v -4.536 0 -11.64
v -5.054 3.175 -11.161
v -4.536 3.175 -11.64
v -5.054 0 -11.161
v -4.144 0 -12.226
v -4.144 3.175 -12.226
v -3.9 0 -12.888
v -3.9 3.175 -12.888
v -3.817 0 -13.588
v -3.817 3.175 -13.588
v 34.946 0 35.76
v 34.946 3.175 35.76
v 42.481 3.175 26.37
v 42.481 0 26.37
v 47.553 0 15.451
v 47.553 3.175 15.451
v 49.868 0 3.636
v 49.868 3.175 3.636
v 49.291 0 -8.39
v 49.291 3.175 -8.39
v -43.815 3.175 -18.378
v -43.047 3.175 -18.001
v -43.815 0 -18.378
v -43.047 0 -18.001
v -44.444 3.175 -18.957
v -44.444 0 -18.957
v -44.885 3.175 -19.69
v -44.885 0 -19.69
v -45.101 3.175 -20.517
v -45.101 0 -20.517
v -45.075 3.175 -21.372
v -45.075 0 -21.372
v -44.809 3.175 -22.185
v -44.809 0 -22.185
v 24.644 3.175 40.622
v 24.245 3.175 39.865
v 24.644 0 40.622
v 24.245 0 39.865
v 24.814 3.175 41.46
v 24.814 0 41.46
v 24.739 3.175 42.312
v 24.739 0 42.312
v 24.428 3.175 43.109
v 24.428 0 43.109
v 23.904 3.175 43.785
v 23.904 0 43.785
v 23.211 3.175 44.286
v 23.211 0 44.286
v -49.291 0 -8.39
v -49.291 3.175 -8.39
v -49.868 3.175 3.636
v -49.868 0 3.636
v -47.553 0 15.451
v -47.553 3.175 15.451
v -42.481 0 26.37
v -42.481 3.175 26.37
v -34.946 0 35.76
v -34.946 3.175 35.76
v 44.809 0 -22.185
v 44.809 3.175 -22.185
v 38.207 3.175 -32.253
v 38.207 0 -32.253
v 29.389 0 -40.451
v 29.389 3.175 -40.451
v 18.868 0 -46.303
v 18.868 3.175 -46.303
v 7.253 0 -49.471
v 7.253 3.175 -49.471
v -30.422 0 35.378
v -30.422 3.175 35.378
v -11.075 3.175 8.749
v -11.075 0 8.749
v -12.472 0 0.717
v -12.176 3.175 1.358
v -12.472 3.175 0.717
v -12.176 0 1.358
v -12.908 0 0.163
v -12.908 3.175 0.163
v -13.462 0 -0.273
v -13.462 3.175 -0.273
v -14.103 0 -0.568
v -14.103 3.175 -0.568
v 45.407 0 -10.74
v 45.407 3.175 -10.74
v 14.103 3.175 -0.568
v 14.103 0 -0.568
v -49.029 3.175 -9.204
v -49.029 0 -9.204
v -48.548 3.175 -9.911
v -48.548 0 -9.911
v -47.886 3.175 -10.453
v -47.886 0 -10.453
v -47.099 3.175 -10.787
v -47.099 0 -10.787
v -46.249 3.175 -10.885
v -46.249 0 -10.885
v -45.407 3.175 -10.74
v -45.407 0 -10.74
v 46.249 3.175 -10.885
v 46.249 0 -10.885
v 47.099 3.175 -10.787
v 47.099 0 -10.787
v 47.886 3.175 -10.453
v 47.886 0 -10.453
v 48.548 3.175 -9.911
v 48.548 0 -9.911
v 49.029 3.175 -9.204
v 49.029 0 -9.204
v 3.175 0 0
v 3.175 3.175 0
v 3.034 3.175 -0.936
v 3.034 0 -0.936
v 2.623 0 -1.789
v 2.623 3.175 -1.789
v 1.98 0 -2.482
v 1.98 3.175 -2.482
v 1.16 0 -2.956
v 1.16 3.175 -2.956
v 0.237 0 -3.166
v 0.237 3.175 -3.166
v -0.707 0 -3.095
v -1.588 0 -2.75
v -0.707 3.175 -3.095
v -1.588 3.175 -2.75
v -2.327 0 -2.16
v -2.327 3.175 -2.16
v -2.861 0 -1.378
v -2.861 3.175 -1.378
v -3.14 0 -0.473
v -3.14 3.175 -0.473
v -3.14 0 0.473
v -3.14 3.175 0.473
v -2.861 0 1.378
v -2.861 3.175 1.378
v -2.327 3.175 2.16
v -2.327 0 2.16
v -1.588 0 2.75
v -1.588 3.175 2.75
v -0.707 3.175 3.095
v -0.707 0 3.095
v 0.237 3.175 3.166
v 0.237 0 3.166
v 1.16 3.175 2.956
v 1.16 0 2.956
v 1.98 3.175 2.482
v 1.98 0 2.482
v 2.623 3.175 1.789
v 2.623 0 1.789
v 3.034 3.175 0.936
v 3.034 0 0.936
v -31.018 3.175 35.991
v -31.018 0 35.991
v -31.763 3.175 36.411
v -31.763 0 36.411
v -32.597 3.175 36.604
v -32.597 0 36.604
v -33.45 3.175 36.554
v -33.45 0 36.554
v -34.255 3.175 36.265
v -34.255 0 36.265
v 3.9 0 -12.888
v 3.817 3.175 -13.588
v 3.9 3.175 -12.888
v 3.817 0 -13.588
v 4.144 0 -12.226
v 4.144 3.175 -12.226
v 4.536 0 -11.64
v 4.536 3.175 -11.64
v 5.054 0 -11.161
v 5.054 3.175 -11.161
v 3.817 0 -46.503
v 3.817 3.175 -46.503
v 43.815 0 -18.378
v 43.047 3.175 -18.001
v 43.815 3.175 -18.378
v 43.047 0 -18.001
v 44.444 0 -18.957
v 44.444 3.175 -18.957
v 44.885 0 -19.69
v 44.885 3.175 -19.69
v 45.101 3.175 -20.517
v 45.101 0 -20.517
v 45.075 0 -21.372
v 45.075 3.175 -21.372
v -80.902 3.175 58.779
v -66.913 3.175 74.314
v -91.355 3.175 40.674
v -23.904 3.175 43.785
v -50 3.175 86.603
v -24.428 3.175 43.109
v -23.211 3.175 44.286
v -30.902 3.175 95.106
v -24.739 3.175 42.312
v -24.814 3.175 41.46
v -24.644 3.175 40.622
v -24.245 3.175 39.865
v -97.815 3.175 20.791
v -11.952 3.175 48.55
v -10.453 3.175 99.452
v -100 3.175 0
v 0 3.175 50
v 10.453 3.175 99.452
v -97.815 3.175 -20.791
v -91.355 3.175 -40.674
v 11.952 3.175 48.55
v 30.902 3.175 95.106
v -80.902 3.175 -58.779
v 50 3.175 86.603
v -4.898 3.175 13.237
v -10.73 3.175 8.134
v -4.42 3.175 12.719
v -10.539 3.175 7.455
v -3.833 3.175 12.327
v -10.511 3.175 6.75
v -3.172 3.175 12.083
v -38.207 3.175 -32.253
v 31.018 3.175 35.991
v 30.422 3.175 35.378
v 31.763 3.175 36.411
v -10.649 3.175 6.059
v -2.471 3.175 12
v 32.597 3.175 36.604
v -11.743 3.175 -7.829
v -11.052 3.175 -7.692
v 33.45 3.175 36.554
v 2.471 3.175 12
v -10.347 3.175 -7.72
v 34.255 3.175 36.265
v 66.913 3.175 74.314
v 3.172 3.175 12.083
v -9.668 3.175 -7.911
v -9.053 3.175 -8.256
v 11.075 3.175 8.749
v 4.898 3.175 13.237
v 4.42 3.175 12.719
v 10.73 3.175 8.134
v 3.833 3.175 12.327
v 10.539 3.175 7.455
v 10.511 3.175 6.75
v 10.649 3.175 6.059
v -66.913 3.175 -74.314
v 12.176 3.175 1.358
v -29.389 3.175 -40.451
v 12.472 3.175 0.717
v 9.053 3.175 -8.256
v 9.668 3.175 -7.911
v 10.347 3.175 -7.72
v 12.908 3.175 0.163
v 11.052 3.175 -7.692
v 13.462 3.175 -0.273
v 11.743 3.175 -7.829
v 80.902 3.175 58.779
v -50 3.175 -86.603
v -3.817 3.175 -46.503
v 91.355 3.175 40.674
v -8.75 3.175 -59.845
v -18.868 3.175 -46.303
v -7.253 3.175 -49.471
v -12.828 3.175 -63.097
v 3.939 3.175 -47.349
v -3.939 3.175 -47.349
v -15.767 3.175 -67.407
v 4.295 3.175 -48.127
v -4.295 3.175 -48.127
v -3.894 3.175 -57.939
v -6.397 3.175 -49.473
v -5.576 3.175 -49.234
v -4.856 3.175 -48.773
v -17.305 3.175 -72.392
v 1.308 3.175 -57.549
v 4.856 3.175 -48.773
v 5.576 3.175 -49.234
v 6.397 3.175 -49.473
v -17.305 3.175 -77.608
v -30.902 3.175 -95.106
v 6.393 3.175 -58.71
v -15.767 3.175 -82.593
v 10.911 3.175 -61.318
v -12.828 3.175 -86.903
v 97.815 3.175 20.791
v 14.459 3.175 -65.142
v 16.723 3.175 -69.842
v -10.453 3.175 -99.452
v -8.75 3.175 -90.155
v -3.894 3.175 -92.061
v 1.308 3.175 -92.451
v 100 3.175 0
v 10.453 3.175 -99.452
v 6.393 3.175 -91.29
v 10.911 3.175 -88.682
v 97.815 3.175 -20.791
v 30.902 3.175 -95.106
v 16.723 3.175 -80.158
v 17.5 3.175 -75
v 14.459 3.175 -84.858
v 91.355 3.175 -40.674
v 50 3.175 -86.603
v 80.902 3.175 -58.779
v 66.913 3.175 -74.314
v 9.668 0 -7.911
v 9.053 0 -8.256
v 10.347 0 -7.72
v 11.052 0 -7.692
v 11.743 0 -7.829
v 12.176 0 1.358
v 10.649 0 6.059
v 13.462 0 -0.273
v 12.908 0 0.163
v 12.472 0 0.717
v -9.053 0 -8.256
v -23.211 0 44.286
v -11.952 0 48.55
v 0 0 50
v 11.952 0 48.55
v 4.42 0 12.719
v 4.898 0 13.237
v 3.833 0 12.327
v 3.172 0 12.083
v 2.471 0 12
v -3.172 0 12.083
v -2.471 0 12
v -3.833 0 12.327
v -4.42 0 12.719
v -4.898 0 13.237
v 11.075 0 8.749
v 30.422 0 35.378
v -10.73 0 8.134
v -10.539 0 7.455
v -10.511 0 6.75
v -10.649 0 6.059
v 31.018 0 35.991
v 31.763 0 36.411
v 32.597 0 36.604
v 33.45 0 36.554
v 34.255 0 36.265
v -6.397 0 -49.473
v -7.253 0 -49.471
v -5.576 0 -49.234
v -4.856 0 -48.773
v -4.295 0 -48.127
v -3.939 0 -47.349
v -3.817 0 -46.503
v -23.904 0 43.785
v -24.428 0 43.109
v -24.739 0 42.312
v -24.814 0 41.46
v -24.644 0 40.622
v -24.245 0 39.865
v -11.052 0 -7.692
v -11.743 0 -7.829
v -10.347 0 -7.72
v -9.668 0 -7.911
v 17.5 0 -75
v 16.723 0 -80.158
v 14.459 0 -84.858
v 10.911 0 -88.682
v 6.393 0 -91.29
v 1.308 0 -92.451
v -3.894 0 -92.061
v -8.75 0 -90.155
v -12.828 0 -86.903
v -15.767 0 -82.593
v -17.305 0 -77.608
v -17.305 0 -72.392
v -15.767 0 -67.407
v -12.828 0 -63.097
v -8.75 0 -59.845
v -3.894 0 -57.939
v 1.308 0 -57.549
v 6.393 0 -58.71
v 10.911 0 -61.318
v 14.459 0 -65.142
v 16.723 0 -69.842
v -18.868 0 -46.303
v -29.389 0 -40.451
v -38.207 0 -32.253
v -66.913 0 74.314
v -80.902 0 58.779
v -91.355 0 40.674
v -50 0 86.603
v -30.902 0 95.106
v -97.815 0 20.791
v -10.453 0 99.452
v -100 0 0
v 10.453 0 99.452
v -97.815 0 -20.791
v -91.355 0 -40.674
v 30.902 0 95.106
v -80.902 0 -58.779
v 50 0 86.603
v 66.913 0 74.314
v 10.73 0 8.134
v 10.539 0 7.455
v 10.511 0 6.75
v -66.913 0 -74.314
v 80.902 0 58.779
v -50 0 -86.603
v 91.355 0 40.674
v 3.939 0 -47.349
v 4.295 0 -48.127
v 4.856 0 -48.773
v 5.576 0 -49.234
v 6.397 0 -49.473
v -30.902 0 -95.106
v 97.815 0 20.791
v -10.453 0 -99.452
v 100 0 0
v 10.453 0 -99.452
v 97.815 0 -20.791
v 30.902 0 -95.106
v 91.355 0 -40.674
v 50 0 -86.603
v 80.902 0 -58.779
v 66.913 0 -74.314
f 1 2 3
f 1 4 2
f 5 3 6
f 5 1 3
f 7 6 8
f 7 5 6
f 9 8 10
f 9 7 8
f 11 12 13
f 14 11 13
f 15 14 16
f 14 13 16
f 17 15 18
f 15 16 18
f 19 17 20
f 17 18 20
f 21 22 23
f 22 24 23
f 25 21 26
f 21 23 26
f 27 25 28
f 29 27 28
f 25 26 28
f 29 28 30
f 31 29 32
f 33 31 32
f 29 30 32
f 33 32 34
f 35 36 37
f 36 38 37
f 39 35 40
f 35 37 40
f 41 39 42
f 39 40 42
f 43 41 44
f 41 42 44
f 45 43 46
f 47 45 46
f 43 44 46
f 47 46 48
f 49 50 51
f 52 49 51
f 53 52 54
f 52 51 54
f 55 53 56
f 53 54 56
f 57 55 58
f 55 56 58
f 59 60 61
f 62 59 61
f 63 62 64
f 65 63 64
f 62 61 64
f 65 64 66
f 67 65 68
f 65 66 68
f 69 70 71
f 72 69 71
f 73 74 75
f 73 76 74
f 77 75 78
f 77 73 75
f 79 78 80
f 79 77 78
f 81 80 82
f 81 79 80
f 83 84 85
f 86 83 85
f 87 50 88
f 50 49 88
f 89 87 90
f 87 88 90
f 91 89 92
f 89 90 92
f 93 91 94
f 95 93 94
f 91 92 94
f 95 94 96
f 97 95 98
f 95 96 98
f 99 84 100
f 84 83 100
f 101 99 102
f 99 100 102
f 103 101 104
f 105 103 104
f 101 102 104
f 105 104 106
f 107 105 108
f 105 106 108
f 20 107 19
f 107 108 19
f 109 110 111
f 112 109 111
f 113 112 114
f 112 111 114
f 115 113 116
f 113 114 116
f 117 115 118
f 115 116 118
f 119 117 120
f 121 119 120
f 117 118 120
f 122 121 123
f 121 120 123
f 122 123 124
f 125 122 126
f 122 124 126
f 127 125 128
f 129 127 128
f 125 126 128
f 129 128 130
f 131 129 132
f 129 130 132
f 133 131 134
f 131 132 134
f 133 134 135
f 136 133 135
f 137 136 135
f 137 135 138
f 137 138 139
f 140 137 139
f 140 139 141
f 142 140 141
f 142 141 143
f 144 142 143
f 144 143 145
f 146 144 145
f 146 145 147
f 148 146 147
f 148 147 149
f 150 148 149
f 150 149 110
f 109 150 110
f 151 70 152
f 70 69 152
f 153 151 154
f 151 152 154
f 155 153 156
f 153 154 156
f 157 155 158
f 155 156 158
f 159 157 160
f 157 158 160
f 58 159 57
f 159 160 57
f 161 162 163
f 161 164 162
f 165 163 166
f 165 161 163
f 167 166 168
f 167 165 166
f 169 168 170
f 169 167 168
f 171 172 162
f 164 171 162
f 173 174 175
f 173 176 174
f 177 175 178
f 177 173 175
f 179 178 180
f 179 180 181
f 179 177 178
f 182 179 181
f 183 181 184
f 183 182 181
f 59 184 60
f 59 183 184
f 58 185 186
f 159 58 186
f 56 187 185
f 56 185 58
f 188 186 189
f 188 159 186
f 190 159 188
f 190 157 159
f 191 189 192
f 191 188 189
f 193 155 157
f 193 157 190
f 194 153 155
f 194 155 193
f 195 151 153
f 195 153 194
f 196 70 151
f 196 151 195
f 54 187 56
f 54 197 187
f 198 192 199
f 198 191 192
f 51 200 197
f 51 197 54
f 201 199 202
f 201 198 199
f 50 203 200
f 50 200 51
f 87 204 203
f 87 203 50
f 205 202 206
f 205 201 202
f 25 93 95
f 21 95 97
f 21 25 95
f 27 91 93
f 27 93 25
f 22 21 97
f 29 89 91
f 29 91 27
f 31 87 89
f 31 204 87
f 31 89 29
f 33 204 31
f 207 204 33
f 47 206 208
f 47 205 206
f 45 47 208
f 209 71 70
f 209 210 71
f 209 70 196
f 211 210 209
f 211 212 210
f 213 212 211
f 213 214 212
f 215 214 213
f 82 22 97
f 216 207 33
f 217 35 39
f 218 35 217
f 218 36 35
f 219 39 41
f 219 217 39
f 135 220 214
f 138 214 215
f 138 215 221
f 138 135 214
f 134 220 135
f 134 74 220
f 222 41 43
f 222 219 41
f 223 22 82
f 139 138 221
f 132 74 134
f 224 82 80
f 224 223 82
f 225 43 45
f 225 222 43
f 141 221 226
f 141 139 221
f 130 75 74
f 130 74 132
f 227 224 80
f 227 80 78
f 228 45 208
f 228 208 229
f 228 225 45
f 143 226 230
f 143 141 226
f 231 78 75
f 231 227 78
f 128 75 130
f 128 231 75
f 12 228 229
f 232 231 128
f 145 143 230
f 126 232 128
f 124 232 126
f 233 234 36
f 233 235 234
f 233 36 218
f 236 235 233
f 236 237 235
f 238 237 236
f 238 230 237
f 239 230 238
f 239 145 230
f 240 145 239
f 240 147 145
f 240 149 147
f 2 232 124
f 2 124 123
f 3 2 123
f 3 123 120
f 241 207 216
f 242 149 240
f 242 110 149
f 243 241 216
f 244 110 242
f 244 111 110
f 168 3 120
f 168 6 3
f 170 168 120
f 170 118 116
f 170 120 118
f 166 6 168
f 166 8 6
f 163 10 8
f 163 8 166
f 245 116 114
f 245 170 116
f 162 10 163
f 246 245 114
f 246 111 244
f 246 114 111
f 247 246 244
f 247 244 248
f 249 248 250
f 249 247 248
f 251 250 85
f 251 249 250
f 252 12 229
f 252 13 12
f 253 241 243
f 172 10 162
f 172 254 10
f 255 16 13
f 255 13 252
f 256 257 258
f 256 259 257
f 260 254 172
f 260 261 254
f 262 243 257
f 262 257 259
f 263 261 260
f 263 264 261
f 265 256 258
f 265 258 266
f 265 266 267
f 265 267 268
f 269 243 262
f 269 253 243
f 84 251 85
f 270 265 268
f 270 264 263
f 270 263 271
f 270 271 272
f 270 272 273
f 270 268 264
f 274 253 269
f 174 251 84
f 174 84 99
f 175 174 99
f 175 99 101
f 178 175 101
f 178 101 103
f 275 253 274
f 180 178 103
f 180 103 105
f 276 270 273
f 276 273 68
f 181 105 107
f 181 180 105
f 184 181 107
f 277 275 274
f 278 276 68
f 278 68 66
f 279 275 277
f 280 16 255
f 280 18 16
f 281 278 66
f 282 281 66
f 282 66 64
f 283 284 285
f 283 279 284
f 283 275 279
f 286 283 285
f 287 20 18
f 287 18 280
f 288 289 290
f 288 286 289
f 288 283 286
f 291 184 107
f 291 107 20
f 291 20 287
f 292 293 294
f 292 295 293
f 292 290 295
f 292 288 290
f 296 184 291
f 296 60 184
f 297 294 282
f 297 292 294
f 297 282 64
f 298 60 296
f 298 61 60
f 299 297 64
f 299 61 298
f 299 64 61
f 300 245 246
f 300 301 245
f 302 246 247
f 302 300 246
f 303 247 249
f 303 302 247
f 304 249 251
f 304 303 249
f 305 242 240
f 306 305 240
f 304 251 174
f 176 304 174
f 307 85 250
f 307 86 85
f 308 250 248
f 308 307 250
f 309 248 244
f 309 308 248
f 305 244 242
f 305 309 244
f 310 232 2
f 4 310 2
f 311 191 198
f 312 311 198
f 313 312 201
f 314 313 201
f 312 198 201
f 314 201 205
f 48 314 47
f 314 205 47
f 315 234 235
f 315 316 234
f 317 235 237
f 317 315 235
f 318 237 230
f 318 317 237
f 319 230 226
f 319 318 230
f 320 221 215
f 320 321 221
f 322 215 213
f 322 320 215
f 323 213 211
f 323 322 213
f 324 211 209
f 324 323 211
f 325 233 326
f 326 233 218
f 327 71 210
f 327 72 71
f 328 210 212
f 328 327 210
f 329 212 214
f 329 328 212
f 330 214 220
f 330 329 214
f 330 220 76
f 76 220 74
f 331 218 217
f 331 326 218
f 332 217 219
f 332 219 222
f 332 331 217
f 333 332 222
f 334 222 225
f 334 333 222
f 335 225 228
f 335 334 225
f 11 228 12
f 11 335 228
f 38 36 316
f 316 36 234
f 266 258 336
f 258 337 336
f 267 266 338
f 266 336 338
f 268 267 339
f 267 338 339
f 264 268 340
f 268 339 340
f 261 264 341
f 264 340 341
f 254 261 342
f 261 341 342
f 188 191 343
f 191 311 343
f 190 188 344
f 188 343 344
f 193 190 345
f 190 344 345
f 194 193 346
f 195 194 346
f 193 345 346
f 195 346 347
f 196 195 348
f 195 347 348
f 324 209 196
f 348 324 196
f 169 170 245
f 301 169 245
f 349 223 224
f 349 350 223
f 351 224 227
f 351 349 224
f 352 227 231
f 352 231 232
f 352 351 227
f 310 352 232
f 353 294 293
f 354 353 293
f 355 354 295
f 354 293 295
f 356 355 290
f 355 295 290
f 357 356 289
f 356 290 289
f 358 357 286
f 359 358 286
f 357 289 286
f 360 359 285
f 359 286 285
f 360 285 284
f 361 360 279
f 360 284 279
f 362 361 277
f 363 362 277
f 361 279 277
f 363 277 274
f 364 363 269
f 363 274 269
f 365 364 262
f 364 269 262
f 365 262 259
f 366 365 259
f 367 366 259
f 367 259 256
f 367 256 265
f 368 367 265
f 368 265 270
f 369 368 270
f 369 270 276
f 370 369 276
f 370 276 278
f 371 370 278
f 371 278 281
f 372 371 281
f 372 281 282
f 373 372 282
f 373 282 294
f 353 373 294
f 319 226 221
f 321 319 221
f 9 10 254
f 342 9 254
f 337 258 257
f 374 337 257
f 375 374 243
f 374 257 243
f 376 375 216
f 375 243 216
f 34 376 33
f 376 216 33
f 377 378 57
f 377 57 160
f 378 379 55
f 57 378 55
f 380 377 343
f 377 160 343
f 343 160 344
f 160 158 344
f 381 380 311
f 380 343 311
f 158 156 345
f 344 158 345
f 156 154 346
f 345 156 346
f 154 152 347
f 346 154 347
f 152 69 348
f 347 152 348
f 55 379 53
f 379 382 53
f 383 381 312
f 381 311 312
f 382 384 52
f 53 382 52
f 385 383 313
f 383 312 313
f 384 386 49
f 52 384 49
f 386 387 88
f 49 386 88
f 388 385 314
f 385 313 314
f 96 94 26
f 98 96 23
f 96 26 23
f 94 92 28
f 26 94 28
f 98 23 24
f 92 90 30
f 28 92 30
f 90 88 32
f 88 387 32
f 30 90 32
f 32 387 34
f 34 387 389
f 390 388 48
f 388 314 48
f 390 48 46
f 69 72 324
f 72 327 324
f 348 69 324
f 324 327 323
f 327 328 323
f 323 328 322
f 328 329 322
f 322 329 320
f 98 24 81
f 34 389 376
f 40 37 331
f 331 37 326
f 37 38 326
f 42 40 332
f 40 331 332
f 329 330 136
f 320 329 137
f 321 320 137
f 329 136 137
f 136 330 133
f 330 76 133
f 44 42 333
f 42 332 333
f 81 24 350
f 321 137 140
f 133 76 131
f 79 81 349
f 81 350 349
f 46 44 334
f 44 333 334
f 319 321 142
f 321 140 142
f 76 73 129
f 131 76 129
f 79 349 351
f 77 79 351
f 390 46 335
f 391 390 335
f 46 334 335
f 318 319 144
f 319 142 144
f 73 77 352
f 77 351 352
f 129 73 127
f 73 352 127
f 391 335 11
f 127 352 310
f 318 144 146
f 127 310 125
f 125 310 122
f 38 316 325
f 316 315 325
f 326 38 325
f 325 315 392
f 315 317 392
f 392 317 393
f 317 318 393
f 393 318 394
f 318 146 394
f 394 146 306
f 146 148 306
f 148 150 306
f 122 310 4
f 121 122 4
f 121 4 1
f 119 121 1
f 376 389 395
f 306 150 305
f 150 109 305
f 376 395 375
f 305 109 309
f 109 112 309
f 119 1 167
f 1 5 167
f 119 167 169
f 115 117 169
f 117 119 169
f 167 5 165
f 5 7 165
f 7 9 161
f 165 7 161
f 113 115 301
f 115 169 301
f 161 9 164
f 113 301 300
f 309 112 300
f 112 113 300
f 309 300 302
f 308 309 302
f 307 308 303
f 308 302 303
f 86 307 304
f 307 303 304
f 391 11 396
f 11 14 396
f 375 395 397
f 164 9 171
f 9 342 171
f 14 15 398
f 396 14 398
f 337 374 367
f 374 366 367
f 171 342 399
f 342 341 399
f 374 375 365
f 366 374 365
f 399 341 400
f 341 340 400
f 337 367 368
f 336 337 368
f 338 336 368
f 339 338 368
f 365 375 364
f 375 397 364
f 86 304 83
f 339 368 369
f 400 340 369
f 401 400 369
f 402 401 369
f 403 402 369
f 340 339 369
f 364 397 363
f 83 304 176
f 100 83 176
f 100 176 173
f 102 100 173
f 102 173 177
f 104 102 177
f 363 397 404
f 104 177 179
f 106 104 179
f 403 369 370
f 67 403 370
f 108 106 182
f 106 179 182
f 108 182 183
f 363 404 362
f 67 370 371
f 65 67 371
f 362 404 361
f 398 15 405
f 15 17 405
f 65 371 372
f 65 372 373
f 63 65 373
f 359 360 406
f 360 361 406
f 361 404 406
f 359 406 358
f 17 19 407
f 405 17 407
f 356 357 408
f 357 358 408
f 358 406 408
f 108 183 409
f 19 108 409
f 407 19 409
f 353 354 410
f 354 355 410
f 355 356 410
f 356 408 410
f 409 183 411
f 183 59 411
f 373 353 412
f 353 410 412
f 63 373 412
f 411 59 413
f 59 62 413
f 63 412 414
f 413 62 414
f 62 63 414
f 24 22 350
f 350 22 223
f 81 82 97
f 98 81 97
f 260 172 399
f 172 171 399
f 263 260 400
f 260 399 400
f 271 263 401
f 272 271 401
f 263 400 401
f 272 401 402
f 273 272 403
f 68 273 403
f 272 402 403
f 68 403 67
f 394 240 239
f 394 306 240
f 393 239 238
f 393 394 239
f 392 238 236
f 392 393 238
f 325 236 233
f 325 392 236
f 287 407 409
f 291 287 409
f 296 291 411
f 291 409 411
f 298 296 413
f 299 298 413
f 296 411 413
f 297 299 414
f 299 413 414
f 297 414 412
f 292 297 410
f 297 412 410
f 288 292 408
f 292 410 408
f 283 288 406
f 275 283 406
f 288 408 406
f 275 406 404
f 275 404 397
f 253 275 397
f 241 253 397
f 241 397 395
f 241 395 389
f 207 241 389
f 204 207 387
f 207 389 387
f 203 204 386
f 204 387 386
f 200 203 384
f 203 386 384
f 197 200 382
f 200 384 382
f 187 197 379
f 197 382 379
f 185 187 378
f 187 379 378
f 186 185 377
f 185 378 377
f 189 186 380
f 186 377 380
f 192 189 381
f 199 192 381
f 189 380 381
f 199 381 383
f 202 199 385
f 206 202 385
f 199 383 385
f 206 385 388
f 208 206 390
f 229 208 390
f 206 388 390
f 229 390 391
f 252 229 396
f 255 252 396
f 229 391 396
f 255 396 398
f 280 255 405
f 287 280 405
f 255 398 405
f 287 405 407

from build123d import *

# Parameters (mm, degrees)
SKETCH1_R                = 100
BOSS_EXTRUDE1_DEPTH      = 3.175
SKETCH2_R                = 17.5
CUT_EXTRUDE1_DEPTH       = 4.175
SKETCH3_R                = 3.175
CUT_EXTRUDE2_DEPTH       = 10
CUT_EXTRUDE3_DEPTH       = 3.175
FILLET1_R                = 3
CIRPATTERN1_COUNT        = 5
FILLET1_OF_CIRPATTERN1_R = 3


with BuildPart() as part:
    # Sketch1 → Boss-Extrude1 (new body)
    with BuildSketch(Plane(origin=(0, 0, 0), x_dir=(1, 0, 0), z_dir=(0, 1, 0))):
        Circle(SKETCH1_R)
    extrude(amount=BOSS_EXTRUDE1_DEPTH)

    # Sketch2 → Cut-Extrude1 (cut, through all)
    with BuildSketch(Plane(origin=(0, 3.175, 0), x_dir=(1, 0, 0), z_dir=(0, 1, 0))):
        with Locations((0, 75)):
            Circle(SKETCH2_R)
    extrude(amount=-CUT_EXTRUDE1_DEPTH, mode=Mode.SUBTRACT)

    # Sketch3 → Cut-Extrude2 (cut)
    with BuildSketch(Plane(origin=(0, 3.175, 0), x_dir=(1, 0, 0), z_dir=(0, 1, 0))):
        Circle(SKETCH3_R)
    extrude(amount=-CUT_EXTRUDE2_DEPTH, mode=Mode.SUBTRACT)

    # Sketch4 → Cut-Extrude3 (cut)
    with BuildSketch(Plane(origin=(0, 3.175, 0), x_dir=(1, 0, 0), z_dir=(0, 1, 0))):
        with BuildLine():
            Line((3.817355, 49.854065), (3.817355, 12.059345))
            Line((3.817355, 12.059345), (10.289491, 7.357063))
            Line((10.289491, 7.357063), (46.234406, 19.036274))
            ThreePointArc((46.234406, 19.036274), (29.389263, 40.45085), (3.817355, 49.854065))
        make_face()
    cut_extrude3 = extrude(amount=-CUT_EXTRUDE3_DEPTH, mode=Mode.SUBTRACT)

    # Fillet1
    fillet1_edges = [part.edges().sort_by_distance(p)[0] for p in [
        (3.817355, 1.5875, -49.854065),
        (46.234406, 1.5875, -19.036274),
        (10.289491, 1.5875, -7.357063),
        (3.817355, 1.5875, -12.059345),
    ]]
    fillet(fillet1_edges, radius=FILLET1_R)

    # CirPattern1: Cut-Extrude3 ×5 about axis
    cirpattern1_axis = Axis((0, 0, 0), (0, 1, 0))
    for i in range(1, CIRPATTERN1_COUNT):
        add(cut_extrude3.rotate(cirpattern1_axis, i * 360 / CIRPATTERN1_COUNT), mode=Mode.SUBTRACT)

    # Fillet1 of CirPattern1
    fillet1_of_cirpattern1_edges = [part.edges().sort_by_distance(p)[0] for p in [
        (-46.234406, 1.5875, -19.036274),
        (-3.817355, 1.5875, -49.854065),
        (-3.817355, 1.5875, -12.059345),
        (-10.289491, 1.5875, -7.357063),
        (-32.391789, 1.5875, 38.089001),
        (-48.593661, 1.5875, -11.775233),
        (-12.648746, 1.5875, -0.096022),
        (-10.17661, 1.5875, 7.51243),
        (26.215179, 1.5875, 42.576571),
        (-26.215179, 1.5875, 42.576571),
        (-4, 1.5875, 12),
        (4, 1.5875, 12),
        (48.593661, 1.5875, -11.775233),
        (32.391789, 1.5875, 38.089001),
        (10.17661, 1.5875, 7.51243),
        (12.648746, 1.5875, -0.096022),
    ]]
    fillet(fillet1_of_cirpattern1_edges, radius=FILLET1_OF_CIRPATTERN1_R)


solid = part.part
